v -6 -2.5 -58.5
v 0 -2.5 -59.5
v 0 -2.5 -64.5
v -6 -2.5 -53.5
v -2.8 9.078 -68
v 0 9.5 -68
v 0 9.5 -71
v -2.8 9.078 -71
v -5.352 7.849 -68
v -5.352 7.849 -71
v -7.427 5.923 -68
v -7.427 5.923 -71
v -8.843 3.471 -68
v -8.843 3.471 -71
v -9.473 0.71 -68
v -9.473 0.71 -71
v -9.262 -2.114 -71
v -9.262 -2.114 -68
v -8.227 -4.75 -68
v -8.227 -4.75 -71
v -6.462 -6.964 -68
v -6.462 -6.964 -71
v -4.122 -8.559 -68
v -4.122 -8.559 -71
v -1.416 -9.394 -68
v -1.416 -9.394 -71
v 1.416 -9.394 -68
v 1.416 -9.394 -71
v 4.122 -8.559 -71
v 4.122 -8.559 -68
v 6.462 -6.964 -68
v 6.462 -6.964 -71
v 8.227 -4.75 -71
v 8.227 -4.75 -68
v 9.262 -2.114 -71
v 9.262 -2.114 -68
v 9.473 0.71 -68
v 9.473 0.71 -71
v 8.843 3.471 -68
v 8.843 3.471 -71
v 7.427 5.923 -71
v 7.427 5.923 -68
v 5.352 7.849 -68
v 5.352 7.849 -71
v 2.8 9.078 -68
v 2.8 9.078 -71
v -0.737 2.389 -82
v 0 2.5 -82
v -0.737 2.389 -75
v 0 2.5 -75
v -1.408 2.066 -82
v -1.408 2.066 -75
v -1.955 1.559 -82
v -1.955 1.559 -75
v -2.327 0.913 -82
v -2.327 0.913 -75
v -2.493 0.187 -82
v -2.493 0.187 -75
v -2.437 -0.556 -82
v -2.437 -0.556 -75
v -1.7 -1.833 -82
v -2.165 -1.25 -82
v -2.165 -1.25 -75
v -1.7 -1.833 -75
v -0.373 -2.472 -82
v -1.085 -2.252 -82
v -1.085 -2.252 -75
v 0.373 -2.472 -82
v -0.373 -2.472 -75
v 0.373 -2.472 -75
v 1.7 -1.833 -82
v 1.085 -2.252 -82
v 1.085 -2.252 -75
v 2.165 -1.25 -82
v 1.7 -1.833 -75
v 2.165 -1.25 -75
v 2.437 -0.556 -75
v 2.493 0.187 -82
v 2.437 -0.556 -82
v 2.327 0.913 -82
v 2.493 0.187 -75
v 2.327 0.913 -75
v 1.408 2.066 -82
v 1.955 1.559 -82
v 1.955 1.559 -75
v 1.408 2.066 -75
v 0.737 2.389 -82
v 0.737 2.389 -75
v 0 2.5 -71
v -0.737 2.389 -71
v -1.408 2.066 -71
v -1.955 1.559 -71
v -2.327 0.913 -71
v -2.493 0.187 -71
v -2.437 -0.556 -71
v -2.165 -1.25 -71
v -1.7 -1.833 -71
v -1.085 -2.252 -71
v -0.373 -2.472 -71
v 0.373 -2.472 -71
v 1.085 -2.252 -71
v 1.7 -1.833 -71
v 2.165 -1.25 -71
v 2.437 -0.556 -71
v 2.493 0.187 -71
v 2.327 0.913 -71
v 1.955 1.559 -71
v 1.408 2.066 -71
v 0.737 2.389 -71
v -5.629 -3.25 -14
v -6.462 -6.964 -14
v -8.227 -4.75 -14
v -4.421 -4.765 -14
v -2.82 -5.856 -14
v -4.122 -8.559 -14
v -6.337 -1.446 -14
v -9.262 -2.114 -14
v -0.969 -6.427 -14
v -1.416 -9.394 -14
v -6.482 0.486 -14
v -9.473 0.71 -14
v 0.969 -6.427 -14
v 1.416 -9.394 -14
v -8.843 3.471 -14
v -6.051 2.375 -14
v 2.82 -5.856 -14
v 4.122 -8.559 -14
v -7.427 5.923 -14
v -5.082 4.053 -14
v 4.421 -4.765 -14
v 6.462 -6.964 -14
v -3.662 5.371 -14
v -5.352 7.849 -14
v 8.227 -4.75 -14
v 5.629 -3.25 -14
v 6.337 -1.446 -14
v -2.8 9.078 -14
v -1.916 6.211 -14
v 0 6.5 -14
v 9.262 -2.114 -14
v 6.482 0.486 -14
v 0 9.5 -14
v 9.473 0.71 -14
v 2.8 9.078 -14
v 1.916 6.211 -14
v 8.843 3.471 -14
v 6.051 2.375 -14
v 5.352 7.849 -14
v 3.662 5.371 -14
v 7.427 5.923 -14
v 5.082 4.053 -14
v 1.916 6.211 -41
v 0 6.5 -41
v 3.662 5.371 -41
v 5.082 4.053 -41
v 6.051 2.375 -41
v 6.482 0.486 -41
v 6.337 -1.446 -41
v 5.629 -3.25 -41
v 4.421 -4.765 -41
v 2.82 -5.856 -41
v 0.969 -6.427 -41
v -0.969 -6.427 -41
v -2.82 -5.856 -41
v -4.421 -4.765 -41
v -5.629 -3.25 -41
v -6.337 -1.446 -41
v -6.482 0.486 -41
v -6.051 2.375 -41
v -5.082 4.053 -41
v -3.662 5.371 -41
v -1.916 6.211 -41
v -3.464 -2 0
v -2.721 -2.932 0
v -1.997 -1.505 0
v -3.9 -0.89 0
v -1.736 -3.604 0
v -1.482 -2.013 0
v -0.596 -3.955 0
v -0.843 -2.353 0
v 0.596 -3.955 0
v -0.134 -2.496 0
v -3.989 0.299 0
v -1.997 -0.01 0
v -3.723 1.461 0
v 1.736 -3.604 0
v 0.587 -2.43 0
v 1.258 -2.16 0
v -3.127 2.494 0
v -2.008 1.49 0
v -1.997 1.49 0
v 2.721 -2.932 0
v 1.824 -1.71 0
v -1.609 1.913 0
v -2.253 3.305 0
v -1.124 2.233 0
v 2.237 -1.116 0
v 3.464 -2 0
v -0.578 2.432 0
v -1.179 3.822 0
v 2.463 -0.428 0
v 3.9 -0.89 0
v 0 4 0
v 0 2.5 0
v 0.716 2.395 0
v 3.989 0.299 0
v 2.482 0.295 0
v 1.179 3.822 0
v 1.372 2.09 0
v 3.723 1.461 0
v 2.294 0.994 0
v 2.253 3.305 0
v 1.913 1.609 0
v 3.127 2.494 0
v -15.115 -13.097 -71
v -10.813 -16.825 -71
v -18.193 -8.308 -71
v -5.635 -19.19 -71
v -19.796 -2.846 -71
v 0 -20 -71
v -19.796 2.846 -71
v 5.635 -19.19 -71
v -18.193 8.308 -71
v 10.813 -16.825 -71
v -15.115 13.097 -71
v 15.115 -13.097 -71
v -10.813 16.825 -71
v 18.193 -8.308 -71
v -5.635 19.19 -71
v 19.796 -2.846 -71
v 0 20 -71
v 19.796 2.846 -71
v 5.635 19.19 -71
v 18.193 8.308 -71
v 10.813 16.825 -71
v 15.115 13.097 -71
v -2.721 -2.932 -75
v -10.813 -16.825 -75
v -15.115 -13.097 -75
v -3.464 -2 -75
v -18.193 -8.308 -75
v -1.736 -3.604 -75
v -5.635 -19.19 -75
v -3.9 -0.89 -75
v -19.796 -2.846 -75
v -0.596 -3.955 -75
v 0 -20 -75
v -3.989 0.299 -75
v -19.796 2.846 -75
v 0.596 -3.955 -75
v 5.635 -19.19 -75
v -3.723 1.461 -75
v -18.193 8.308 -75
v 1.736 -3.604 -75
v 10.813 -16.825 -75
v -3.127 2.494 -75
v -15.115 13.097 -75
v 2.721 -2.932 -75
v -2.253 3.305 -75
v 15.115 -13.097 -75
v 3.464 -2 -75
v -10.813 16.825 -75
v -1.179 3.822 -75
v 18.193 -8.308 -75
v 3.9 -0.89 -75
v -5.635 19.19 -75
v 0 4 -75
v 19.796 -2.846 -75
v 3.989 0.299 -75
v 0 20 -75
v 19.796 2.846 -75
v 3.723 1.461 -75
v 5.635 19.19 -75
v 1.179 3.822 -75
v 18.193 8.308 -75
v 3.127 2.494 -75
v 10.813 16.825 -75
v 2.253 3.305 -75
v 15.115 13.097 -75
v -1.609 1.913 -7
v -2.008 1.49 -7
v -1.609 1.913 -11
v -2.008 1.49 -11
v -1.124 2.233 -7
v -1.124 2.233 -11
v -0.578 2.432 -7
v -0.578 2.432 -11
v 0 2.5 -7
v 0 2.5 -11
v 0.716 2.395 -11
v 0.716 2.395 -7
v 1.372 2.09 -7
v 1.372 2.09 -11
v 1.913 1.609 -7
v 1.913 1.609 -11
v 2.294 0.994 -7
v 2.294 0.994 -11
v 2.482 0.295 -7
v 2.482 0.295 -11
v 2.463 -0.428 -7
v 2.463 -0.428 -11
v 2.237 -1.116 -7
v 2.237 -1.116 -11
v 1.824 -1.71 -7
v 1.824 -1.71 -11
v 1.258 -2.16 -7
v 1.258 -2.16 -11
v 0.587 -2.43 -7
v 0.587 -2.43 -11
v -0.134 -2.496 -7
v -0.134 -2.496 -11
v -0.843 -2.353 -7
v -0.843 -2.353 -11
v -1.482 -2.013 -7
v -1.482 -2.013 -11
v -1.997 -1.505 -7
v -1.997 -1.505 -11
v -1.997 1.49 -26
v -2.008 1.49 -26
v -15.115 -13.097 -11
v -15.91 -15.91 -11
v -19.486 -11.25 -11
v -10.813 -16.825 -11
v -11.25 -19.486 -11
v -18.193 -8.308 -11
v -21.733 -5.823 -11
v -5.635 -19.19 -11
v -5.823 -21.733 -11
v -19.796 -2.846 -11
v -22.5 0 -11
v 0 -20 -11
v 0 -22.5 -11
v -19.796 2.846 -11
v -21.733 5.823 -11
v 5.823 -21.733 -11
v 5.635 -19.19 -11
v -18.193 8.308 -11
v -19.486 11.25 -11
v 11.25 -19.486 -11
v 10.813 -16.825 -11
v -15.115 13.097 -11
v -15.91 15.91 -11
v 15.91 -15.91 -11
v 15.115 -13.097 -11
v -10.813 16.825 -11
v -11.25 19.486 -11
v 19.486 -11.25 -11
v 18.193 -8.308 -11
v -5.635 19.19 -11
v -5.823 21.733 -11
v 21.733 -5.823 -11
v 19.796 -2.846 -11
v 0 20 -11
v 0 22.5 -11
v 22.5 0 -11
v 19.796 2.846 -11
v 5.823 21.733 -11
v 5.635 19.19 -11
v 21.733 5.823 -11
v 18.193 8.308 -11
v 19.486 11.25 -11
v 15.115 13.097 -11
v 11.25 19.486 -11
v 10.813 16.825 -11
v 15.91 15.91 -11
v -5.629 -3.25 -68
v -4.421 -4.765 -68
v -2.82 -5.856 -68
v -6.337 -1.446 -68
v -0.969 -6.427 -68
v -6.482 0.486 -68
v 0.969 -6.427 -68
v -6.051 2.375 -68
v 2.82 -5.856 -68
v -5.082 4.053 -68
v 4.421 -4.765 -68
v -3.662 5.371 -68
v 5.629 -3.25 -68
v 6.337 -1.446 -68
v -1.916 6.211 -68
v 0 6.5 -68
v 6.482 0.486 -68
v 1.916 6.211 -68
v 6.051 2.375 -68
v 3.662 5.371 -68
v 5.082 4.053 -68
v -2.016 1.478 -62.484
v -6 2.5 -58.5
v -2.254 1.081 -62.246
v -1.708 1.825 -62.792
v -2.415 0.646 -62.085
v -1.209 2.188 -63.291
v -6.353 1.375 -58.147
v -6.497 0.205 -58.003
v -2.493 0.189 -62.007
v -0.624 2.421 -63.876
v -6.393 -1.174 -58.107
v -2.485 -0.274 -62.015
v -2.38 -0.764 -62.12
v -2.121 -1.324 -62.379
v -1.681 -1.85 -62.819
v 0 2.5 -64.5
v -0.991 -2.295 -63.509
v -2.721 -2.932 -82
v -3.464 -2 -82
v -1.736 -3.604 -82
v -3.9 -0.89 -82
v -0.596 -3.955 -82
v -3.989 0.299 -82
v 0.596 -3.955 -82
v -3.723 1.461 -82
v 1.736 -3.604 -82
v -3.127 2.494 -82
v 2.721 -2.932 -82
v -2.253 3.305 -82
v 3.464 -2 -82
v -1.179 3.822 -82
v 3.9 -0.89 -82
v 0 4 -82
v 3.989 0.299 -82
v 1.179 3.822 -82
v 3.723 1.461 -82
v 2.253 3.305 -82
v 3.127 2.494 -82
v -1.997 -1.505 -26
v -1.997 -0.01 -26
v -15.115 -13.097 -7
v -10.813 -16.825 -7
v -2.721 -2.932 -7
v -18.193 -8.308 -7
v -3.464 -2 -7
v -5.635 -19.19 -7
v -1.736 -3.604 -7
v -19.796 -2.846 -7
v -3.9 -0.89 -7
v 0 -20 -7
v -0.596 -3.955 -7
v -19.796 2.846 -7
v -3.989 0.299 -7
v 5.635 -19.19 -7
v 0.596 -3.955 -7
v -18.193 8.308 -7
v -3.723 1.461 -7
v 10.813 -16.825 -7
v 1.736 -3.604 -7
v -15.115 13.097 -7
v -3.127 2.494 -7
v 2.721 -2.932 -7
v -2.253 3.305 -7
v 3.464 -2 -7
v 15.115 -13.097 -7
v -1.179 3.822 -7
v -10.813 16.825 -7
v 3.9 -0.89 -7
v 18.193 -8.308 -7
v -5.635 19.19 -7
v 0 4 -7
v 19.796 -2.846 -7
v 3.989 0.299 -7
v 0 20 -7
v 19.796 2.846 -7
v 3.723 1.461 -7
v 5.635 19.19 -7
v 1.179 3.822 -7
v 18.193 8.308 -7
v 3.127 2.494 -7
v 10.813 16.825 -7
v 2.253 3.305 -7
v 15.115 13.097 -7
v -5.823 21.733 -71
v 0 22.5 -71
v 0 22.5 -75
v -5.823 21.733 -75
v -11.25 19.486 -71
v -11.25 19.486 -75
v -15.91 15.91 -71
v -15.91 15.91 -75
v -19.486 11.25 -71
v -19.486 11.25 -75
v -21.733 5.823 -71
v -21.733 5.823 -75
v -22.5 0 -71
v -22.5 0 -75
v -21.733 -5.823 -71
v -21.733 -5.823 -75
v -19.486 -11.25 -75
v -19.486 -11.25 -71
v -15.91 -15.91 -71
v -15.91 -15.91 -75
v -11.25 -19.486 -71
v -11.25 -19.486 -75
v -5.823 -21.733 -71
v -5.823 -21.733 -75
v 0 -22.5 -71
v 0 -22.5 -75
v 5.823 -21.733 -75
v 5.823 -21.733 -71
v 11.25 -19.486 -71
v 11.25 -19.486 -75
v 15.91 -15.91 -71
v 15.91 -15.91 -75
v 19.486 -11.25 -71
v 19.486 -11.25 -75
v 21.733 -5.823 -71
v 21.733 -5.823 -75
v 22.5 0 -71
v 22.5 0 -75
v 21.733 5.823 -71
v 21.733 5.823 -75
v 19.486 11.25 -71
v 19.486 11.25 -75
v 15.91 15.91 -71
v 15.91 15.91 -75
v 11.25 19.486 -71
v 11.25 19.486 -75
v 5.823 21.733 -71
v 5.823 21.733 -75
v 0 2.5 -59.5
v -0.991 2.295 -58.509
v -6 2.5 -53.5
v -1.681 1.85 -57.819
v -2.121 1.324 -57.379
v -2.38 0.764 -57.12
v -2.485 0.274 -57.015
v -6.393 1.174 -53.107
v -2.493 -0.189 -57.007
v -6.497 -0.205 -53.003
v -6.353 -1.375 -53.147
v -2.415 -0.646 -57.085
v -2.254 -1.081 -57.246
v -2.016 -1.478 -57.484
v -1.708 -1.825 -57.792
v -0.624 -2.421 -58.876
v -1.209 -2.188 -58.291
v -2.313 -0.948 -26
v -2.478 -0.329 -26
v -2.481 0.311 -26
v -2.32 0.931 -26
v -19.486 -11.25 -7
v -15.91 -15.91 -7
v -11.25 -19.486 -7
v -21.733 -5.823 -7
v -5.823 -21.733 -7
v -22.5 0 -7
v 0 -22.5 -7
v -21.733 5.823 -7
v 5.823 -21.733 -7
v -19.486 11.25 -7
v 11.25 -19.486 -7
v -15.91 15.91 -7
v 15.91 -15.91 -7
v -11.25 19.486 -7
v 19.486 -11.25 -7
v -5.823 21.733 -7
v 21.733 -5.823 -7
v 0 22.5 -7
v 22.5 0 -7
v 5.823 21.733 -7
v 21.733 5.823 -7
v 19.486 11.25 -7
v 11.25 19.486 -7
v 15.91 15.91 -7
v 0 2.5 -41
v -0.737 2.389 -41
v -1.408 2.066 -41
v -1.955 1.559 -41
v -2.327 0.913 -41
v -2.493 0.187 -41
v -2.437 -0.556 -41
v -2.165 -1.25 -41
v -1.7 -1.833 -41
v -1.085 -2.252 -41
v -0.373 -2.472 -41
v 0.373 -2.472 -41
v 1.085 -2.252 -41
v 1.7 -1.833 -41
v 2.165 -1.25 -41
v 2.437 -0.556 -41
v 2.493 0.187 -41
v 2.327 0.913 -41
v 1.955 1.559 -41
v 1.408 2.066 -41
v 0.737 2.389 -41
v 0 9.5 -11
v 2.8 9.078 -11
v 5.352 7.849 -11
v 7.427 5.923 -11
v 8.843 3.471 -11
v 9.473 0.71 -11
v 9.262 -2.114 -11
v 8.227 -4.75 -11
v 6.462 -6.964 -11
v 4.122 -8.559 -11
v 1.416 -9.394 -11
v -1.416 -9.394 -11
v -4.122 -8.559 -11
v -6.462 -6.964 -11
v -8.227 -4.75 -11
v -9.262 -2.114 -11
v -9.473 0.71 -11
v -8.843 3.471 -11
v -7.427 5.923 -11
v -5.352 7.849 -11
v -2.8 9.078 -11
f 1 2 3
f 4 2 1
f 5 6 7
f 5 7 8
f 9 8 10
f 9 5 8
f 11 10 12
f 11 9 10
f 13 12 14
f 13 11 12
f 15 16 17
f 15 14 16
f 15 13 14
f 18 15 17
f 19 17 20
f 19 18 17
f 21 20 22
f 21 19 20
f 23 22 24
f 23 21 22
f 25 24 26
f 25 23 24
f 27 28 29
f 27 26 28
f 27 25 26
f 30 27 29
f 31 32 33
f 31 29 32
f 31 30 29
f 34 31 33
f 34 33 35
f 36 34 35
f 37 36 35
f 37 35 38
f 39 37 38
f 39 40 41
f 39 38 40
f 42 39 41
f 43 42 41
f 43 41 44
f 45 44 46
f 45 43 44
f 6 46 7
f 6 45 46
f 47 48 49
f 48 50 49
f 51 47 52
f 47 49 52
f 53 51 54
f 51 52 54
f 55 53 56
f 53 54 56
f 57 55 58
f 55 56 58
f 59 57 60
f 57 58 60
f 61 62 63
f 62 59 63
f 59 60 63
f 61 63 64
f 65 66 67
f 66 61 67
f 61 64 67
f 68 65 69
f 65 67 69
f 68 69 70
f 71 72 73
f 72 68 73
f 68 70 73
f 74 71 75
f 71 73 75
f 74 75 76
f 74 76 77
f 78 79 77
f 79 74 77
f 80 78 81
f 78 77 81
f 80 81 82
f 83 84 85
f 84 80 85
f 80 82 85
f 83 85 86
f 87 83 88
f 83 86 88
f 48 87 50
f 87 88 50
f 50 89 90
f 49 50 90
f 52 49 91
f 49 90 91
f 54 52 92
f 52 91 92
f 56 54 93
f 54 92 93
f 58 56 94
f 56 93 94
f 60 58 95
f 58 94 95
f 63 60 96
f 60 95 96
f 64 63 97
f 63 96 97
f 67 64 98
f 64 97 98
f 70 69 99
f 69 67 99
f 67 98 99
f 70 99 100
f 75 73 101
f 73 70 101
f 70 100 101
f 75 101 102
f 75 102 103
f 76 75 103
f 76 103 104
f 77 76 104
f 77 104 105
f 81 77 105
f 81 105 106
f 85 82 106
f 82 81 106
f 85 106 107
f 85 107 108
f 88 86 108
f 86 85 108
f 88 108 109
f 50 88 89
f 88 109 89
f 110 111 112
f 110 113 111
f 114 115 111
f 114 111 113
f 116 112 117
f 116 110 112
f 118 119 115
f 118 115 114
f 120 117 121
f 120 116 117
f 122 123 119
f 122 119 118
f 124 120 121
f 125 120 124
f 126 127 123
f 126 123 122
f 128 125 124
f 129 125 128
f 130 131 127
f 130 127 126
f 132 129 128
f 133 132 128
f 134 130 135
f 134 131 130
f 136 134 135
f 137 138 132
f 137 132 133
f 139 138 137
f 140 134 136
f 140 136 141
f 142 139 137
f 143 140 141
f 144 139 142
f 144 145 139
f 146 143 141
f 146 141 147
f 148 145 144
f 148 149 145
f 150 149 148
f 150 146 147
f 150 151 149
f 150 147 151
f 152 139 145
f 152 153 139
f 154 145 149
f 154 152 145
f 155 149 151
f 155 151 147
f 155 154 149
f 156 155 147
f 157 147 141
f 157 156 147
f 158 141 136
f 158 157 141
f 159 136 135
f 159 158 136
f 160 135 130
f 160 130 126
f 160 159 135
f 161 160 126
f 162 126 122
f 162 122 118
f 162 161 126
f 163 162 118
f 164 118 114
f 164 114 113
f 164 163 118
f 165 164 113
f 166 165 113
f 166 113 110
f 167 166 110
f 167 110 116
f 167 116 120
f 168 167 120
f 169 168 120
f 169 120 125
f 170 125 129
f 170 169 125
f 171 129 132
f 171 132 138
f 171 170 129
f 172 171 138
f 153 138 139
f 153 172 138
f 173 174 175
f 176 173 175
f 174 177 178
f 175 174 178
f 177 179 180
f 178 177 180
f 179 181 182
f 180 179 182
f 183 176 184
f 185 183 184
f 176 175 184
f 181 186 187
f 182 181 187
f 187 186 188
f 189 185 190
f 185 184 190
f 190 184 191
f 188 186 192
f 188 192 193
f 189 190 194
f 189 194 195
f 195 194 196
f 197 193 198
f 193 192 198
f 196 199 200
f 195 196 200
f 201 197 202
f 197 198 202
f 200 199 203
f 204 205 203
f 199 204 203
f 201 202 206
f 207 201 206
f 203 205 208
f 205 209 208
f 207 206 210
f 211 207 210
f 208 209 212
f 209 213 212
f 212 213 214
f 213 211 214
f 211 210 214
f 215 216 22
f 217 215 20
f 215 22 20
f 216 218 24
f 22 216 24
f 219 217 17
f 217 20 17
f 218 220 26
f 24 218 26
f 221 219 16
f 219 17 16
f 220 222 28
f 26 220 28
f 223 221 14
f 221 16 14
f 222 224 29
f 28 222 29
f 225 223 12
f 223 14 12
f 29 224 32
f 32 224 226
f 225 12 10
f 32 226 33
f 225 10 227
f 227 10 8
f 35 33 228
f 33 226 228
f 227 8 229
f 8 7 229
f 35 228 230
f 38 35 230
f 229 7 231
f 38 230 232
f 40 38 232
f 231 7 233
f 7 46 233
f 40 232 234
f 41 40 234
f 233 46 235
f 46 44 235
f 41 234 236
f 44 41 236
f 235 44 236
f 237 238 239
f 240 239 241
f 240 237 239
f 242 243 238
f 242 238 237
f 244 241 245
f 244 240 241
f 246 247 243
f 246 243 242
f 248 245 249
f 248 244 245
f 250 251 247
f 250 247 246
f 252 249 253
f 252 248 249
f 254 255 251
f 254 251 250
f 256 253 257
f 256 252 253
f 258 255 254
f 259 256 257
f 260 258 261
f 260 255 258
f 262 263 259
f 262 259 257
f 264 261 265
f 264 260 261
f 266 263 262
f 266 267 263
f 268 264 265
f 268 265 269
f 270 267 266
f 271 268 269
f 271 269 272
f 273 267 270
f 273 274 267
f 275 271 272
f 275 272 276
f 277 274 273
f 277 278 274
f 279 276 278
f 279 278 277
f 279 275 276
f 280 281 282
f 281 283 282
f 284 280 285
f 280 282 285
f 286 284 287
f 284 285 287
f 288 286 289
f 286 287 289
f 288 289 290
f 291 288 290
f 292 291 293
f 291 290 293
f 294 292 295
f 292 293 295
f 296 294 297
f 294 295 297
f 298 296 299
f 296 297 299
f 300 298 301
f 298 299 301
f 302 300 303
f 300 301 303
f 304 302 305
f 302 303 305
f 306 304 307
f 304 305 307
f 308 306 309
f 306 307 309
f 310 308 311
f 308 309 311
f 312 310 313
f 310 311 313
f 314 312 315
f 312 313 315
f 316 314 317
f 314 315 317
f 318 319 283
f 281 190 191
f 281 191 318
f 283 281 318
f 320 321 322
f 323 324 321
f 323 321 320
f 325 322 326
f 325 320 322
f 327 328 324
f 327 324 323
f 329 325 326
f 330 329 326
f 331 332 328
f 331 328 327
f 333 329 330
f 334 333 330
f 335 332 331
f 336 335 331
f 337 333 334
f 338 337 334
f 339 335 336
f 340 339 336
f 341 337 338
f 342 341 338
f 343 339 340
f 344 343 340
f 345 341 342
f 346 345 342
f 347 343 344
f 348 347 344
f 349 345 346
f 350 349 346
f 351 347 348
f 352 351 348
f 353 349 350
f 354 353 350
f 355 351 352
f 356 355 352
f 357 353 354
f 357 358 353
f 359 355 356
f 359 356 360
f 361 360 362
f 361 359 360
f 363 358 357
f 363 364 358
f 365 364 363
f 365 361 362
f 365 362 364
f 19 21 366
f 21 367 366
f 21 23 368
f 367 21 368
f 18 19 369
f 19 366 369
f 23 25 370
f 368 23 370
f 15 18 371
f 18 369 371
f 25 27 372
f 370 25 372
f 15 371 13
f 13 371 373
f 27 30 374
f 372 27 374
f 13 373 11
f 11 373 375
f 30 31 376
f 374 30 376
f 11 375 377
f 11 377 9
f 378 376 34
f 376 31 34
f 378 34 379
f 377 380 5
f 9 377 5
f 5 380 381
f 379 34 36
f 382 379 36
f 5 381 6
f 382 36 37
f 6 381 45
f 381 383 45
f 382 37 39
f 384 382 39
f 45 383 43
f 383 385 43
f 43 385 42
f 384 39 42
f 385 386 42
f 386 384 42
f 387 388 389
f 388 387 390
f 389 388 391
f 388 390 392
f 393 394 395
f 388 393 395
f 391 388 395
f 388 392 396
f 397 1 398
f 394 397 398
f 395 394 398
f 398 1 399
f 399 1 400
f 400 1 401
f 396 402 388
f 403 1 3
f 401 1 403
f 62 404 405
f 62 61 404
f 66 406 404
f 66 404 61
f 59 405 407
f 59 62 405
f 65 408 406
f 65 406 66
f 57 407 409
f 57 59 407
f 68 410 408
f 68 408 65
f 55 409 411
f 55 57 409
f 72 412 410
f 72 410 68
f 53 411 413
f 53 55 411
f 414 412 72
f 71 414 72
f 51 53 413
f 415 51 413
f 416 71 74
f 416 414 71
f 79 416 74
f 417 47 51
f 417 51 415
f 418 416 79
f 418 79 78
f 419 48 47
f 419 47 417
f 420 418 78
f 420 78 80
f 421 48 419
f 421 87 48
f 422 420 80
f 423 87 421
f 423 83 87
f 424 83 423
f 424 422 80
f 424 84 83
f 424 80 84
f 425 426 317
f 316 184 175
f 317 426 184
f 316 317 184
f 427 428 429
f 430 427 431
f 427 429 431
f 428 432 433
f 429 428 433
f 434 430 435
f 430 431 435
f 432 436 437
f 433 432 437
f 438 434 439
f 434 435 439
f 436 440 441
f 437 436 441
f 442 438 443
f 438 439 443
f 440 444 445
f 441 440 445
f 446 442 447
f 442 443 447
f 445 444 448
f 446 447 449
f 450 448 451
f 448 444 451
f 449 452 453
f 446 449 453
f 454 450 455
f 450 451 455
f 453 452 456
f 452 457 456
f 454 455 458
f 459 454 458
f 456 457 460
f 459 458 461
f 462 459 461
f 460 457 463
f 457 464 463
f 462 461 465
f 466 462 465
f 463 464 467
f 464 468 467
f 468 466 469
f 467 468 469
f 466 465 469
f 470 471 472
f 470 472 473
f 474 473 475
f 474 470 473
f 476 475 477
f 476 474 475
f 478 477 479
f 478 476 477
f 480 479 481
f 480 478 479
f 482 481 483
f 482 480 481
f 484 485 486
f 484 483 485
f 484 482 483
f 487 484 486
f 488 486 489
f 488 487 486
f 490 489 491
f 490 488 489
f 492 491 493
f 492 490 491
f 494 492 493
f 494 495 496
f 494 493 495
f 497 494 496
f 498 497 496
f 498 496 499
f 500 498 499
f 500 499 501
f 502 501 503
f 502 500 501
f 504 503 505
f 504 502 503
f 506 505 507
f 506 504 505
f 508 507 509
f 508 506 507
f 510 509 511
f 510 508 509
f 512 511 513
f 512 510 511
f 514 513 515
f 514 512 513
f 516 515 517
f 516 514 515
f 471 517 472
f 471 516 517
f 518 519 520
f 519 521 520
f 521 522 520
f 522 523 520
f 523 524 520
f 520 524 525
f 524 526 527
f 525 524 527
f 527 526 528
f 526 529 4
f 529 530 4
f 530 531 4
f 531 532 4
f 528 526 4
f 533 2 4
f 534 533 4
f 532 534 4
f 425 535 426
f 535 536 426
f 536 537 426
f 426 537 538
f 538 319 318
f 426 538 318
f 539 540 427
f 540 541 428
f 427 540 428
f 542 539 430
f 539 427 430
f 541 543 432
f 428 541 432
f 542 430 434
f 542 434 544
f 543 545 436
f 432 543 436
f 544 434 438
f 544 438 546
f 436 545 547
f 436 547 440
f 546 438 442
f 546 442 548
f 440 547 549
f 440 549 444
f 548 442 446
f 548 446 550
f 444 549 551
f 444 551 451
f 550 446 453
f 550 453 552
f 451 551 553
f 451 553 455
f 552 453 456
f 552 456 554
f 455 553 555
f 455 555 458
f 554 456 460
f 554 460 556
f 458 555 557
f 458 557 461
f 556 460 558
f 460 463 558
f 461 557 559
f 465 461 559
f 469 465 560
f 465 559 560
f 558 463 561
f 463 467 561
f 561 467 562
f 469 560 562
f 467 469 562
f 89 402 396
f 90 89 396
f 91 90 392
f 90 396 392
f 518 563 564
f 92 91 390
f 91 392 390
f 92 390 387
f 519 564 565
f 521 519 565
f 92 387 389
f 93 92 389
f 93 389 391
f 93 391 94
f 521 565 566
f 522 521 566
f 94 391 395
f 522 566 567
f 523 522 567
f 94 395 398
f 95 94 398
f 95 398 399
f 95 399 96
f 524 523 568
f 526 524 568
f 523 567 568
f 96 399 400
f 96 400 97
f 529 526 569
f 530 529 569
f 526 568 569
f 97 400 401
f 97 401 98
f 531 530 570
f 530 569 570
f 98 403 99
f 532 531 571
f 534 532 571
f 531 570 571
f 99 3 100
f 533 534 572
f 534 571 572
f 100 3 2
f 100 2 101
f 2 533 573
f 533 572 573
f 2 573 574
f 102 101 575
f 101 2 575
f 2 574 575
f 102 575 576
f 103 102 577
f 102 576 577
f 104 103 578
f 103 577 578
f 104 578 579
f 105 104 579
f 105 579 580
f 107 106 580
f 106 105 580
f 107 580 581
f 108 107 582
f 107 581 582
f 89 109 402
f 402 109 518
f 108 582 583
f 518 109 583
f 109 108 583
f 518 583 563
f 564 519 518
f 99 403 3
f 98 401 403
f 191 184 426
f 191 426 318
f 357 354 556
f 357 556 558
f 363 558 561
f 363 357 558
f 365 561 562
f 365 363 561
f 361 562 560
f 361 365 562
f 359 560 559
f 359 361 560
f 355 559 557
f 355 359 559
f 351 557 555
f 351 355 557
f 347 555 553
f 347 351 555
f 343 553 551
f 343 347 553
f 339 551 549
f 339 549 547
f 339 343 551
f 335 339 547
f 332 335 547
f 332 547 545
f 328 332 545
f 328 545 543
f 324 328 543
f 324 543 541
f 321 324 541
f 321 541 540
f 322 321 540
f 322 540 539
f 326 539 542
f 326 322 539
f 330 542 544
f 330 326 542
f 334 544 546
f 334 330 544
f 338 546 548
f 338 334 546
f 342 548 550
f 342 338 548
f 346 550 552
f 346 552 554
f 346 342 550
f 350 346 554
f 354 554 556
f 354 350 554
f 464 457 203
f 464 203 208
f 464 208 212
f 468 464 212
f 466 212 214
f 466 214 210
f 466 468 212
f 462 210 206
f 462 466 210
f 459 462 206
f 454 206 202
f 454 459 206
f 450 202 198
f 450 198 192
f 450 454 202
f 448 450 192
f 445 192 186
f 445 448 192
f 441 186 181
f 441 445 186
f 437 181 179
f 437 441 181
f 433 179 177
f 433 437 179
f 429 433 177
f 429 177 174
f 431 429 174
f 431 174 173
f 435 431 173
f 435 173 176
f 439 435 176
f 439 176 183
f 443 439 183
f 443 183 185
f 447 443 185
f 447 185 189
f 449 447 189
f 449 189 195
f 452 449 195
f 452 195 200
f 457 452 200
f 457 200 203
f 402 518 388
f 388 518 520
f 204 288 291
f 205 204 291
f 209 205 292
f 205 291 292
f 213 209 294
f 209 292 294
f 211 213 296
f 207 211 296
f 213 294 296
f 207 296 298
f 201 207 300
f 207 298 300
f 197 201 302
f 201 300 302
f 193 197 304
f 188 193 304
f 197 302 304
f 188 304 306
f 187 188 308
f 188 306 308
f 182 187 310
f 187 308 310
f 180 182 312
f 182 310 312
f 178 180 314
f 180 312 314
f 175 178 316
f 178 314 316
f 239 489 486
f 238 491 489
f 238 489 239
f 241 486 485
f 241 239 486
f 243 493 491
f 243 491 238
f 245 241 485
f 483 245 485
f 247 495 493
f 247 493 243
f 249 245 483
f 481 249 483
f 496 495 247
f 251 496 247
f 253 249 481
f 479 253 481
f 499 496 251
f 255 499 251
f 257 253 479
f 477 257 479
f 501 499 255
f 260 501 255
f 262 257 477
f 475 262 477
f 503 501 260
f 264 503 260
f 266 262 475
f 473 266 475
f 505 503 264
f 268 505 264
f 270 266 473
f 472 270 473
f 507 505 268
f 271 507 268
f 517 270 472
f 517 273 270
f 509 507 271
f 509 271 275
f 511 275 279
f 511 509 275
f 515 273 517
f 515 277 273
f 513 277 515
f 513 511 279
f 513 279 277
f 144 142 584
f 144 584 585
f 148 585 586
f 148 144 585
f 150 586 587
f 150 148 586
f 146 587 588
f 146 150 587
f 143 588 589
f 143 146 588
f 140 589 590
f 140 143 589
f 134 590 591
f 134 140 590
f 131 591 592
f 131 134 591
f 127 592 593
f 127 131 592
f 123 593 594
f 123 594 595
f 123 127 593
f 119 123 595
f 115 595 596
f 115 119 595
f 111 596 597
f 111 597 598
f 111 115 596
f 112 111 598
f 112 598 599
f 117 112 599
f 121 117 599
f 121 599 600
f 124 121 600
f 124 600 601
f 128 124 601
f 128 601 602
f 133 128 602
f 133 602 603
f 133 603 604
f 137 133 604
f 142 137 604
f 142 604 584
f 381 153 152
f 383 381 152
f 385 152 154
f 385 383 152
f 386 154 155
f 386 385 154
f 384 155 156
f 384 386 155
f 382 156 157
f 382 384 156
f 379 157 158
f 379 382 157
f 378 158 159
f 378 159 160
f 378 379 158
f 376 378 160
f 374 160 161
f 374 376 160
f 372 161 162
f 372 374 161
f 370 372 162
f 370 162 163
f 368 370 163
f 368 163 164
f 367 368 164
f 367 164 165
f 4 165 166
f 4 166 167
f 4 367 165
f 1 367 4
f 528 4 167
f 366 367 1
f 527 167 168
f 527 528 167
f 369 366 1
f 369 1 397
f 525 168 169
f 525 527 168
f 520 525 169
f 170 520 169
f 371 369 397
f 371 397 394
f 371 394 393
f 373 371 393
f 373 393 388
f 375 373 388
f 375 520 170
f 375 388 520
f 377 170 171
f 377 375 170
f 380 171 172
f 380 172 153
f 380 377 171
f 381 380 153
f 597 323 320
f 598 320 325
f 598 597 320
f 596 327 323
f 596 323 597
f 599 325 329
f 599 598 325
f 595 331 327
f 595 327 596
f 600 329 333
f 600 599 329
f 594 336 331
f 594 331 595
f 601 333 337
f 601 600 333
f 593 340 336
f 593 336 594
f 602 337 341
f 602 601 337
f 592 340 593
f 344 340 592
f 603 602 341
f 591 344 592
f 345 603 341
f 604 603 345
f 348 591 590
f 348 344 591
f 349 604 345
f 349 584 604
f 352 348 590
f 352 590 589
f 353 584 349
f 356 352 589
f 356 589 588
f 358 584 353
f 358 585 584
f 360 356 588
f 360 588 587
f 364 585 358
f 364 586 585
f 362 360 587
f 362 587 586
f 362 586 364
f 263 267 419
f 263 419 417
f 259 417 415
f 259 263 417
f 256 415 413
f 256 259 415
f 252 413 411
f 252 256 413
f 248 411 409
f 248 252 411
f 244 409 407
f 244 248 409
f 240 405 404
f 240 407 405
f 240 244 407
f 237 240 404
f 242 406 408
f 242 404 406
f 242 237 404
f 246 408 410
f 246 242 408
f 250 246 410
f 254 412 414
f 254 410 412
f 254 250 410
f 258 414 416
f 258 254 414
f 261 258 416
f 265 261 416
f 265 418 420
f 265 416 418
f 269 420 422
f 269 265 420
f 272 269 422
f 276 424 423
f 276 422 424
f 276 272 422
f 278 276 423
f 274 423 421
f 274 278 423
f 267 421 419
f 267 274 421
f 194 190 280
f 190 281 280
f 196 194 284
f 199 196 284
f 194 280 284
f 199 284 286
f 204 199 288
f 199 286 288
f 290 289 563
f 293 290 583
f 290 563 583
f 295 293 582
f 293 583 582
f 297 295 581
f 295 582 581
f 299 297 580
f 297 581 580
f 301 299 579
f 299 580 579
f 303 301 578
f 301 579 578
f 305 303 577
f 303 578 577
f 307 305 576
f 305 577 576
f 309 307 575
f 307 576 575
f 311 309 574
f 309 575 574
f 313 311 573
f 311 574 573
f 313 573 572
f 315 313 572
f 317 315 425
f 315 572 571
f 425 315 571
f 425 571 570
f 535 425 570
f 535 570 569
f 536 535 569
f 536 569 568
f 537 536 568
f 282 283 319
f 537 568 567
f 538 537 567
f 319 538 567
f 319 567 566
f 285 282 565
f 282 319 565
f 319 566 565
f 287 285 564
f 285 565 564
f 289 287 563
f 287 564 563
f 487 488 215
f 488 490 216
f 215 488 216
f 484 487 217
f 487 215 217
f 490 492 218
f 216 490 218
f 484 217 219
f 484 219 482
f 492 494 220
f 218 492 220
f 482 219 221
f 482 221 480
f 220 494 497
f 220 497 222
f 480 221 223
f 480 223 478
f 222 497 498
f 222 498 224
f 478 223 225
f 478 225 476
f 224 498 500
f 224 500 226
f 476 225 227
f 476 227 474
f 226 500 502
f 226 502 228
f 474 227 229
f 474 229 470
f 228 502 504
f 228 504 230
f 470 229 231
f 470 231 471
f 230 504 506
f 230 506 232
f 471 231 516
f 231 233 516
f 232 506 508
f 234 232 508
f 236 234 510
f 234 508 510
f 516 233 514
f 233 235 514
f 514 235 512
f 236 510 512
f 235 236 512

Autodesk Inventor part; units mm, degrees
ref_plane "YZ Plane" through (0, 0, 0) normal (1, 0, 0) x (0, 1, 0)
ref_plane "XZ Plane" through (0, 0, 0) normal (0, 1, 0) x (-1, 0, 0)
ref_plane "XY Plane" through (0, 0, 0) normal (0, 0, 1) x (1, 0, 0)
sketch "Sketch1" plane through (0, 0, 0) normal (1, 0, 0) x (0, 1, 0)
  line L0 (0, 0) -> (2.5, 0)
  line L1 (0, 0) -> (4, 0)
  line L2 (2.5, 0) -> (2.5, -7)
  line L3 (2.5, -7) -> (0, -7)
  line L4 (0, -7) -> (20, -7)
  line L5 (4, 0) -> (4, -7)
  line L6 (2.5, -7) -> (2.5, -41)
  line L7 (20, -7) -> (20, -11)
  line L8 (20, -11) -> (2.5, -11)
  line L9 (20, -7) -> (22.5, -7)
  line L10 (22.5, -7) -> (22.5, -11)
  line L11 (22.5, -11) -> (20, -11)
  line L12 (20, -11) -> (20, -7)
  line L13 (20, -7) -> (20, -11)
  line L14 (4, 0) -> (2.5, 0)
  line L15 (2.5, 0) -> (2.5, -11)
  line L16 (2.5, -11) -> (4, -11)
  line L17 (4, -11) -> (4, 0)
  line L18 (2.5, -11) -> (22.5, -11)
  line L19 (22.5, -11) -> (22.5, -7)
  line L20 (22.5, -7) -> (2.5, -7)
  line L21 (2.5, -7) -> (2.5, -11)
  line L22 (2.5, -11) -> (6.5, -11)
  line L23 (0, -7) -> (0, -105.9451)
  line L24 (2.5, -41) -> (25, -41)
  line L25 (0, -82) -> (2.5, -82)
  line L26 (0, -82) -> (4, -82)
  line L27 (2.5, -82) -> (2.5, -75)
  line L28 (2.5, -75) -> (0, -75)
  line L29 (0, -75) -> (20, -75)
  line L30 (4, -82) -> (4, -75)
  line L31 (20, -75) -> (20, -71)
  line L32 (20, -71) -> (2.5, -71)
  line L33 (20, -75) -> (22.5, -75)
  line L34 (22.5, -75) -> (22.5, -71)
  line L35 (22.5, -71) -> (20, -71)
  line L36 (20, -71) -> (20, -75)
  line L37 (20, -75) -> (20, -71)
  line L38 (4, -82) -> (2.5, -82)
  line L39 (2.5, -82) -> (2.5, -71)
  line L40 (2.5, -71) -> (4, -71)
  line L41 (4, -71) -> (4, -82)
  line L42 (2.5, -71) -> (22.5, -71)
  line L43 (22.5, -71) -> (22.5, -75)
  line L44 (22.5, -75) -> (2.5, -75)
  line L45 (2.5, -75) -> (2.5, -71)
  line L46 (2.5, -71) -> (6.5, -71)
  line L47 (2.5, -11) -> (6.5, -11)
  line L48 (6.5, -11) -> (6.5, -71)
  line L49 (6.5, -71) -> (2.5, -71)
  line L50 (2.5, -71) -> (2.5, -11)
  line L51 (6.5, -11) -> (9.5, -11)
  line L52 (9.5, -11) -> (9.5, -14)
  line L53 (9.5, -14) -> (6.5, -14)
  line L54 (6.5, -14) -> (6.5, -11)
  line L55 (6.5, -71) -> (9.5, -71)
  line L56 (9.5, -71) -> (9.5, -68)
  line L57 (9.5, -68) -> (6.5, -68)
  line L58 (6.5, -68) -> (6.5, -71)
  dimension "d1" = 2.5
  dimension "d2" = 4
  dimension "d3" = 7
  dimension "d4" = 20
  dimension "d5" = 34
  dimension "d9" = 4
  dimension "d12" = 2.5
  dimension "d13" = 4
  dimension "d55" = 22.5
  dimension "d56" = 4
  dimension "d80" = 3
  dimension "d81" = 3
  dimension "d82" = 3
  dimension "d83" = 3
revolve "Revolution2" add sketch "Sketch1" angle 360 about axis through (0, 0, -7) along (0, 0, -1) contours L1 L5 L4 L2 | L4 L17 L8 L6 | L4 L7 L8 L17 | L8 L48 L24 L6 | L9 L10 L11 L7 | L24 L48 L32 L50 | L8 L52 L53 L48 | L29 L30 L26 L27 | L39 L32 L41 L29 | L41 L32 L31 L29 | L57 L56 L32 L48 | L31 L35 L34 L33
sketch "Sketch6" plane through (0, 0, 0) normal (0, 1, 0) x (-1, 0, 0)
  line L0 (-2.5, -82) -> (2.5, -82) projected
  line L1 (0, -82) -> (0, -62)
  line L2 (0, -82) -> (20, -82) construction
  line L3 (0, -65) -> (15, -65) construction
  line L4 (0, -59) -> (15, -59) construction
  line L5 (10.6066, -48.3934) -> (10.6066, -54.3934)
  line L6 (0, -65) -> (0, -59)
  line L7 (0, -62) -> (0, -59.5)
  line L8 (0, -59.5) -> (10.6066, -48.8934)
  line L9 (10.6066, -48.8934) -> (10.6066, -53.8934)
  line L10 (10.6066, -53.8934) -> (0, -64.5)
  line L11 (0, -59.5) -> (0, -64.5)
  point P0 (0, 0)
  dimension "d64" = 20
  dimension "d65" = 90
  dimension "d69" = 15
  dimension "d71" = 15
  dimension "d75" = 2.5
  dimension "d76" = 5
extrude "Extrusion6" cut sketch "Sketch6" along normal mid plane 5
sketch "Sketch7" plane through (0, 0, 0) normal (0, 0, 1) x (1, 0, 0)
  arc A0 (-1.9966, -1.5104) -> (-1.9966, 1.4896) centre (0.0034, -0.0104) ccw
  line L0 (-1.9966, -0.0104) -> (-1.9966, 1.4896)
  line L1 (-1.9966, -0.0104) -> (-1.9966, -1.5104)
  line L2 (-1.9966, 1.4896) -> (-1.9966, -2.007)
  line L3 (-1.9966, -2.007) -> (-3.9862, -2.007)
  line L4 (-3.9862, -2.007) -> (-3.9862, 1.4896)
  line L5 (-3.9862, 1.4896) -> (-1.9966, 1.4896)
  line L6 (-1.9966, -1.5104) -> (-3.2272, -1.5104)
  line L7 (-3.2272, -1.5104) -> (-3.2272, 1.4896)
  line L8 (-3.2272, 1.4896) -> (-1.9966, 1.4896)
  line L9 (-1.9966, 1.4896) -> (-1.9966, -1.5104)
  point P0 (0, 0)
  point P1 (0, 0)
  dimension "d77" = 5
extrude "Extrusion7" add sketch "Sketch7" against normal blind 26 contours L6 L7 L5 L0 L1
properties part number "Spool_revB"
